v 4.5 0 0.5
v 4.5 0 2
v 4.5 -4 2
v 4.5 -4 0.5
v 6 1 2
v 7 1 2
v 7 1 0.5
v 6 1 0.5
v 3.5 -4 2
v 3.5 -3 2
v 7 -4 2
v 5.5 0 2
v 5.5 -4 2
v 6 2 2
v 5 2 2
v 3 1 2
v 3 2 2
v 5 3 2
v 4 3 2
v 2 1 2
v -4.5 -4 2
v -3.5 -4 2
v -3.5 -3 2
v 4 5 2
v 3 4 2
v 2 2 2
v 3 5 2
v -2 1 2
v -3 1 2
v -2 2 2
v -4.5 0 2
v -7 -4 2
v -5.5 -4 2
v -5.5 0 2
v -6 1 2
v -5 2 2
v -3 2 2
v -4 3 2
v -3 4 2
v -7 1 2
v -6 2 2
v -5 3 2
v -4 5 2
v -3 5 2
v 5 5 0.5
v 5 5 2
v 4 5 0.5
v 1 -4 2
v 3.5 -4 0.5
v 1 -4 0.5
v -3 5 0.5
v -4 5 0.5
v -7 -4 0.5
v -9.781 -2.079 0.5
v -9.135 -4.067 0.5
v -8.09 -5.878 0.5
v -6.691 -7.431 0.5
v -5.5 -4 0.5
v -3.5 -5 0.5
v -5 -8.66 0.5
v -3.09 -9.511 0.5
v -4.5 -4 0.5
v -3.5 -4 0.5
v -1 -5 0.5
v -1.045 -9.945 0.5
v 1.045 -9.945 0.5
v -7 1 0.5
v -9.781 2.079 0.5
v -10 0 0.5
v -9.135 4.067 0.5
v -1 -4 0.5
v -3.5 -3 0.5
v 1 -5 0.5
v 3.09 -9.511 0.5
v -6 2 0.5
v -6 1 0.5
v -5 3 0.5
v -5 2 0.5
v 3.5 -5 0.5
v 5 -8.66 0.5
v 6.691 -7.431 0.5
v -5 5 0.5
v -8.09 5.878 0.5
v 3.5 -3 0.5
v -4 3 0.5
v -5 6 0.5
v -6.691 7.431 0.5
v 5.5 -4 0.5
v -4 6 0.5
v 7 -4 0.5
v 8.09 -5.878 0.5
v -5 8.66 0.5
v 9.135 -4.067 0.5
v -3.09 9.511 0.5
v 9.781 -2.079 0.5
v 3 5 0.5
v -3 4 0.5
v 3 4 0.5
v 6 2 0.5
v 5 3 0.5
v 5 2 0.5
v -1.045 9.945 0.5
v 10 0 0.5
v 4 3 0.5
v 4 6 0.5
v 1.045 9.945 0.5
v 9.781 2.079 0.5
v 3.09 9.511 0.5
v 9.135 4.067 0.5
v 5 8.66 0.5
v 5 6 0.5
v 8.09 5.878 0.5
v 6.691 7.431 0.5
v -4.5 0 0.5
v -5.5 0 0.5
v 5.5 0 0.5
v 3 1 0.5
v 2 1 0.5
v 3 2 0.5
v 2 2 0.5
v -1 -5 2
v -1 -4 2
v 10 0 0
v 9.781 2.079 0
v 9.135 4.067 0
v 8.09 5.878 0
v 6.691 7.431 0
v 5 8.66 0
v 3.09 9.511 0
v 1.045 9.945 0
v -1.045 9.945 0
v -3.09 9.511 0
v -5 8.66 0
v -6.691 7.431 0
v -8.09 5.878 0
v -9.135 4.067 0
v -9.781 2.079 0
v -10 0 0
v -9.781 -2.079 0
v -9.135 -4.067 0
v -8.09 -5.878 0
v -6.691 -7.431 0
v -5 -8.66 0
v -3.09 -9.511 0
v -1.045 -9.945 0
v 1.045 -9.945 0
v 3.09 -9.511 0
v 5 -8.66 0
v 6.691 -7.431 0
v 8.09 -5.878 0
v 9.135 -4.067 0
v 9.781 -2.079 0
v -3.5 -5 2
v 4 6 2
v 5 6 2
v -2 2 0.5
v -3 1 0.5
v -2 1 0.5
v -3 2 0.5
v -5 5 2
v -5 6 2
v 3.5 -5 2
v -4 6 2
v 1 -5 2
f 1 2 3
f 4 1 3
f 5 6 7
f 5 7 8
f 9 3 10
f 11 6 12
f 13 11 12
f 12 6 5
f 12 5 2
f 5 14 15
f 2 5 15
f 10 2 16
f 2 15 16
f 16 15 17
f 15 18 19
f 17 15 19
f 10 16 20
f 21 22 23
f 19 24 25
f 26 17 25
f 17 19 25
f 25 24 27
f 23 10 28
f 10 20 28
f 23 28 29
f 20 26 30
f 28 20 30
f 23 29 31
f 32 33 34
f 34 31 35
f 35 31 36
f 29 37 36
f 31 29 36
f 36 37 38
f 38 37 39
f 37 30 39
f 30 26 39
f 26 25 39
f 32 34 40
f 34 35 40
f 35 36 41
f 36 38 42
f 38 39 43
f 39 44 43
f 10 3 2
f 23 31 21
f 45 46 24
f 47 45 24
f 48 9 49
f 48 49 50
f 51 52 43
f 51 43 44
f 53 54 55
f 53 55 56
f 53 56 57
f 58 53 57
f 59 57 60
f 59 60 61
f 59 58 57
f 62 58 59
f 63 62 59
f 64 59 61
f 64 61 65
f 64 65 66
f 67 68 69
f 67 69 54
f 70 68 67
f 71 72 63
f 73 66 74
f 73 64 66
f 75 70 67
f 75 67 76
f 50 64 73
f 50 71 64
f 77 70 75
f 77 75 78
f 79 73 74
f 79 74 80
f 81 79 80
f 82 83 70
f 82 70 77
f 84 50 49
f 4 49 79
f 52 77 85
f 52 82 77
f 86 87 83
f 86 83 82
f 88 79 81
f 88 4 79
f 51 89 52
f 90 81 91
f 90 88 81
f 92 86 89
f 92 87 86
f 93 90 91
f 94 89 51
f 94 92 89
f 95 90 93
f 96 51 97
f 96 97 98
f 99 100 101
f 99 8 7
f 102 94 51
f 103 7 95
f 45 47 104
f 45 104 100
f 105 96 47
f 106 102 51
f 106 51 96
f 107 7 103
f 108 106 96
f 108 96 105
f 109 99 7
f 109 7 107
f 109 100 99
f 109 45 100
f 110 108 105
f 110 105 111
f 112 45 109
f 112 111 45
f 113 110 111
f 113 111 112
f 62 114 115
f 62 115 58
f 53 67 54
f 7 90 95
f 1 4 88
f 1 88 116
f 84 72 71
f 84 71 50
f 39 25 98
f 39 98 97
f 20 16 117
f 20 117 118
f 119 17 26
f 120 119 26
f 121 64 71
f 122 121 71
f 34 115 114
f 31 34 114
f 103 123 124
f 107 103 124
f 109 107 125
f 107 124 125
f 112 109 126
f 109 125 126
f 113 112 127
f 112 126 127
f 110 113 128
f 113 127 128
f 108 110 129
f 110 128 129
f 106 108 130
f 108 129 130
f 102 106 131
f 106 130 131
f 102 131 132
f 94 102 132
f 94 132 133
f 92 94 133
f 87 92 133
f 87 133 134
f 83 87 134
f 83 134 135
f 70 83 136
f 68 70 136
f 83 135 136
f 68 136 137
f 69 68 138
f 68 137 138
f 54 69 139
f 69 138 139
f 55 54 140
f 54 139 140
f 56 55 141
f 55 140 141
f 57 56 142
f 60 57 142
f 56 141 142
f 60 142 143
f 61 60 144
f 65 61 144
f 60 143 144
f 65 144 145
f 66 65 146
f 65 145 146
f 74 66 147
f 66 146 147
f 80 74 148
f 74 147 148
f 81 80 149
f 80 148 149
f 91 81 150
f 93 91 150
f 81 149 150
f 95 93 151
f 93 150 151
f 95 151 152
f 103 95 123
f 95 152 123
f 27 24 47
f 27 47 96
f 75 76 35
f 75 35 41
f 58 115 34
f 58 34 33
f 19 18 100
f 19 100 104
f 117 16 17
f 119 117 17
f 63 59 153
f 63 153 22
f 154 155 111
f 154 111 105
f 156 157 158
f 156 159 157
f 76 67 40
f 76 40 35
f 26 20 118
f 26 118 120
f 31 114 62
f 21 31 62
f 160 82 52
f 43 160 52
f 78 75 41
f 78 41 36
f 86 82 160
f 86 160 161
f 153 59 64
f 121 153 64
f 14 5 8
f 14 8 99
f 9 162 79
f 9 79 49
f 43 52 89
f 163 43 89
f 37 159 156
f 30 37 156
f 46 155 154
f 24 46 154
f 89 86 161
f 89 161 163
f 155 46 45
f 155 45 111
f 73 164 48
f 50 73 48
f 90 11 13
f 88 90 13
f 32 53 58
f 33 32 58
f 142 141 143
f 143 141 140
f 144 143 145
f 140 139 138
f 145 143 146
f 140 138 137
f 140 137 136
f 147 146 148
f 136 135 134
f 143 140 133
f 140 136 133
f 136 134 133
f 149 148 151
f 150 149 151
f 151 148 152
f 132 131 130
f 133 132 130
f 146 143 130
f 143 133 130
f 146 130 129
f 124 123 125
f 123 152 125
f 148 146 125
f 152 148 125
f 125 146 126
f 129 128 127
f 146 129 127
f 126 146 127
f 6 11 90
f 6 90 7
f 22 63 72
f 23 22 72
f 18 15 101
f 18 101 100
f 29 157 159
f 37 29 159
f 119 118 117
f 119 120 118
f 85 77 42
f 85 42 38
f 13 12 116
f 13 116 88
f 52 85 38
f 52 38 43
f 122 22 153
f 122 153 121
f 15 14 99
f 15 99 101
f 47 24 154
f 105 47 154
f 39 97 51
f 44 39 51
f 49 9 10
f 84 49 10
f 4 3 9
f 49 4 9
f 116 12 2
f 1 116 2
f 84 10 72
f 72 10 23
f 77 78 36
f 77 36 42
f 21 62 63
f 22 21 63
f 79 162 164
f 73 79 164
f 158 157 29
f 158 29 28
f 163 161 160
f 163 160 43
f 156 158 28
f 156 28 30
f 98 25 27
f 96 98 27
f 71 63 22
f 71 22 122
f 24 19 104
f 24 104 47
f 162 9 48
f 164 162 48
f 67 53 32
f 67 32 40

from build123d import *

# Parameters (mm, degrees)
BOX025_W                  = 1
BOX025_H                  = 1
BOX025_DEPTH              = 2
BOX027_W                  = 10
BOX027_H                  = 10
BOX027_DEPTH              = 10
BOX024_W                  = 10
BOX024_H                  = 10
BOX024_DEPTH              = 10
BOX017_W                  = 1
BOX017_H                  = 1
BOX017_DEPTH              = 2
BOX018_W                  = 1
BOX018_H                  = 1
BOX018_DEPTH              = 2
BOX019_W                  = 4
BOX019_H                  = 1
BOX019_DEPTH              = 2
BOX020_W                  = 1
BOX020_H                  = 1
BOX020_DEPTH              = 2
BOX021_W                  = 1
BOX021_H                  = 1
BOX021_DEPTH              = 2
BOX022_W                  = 4
BOX022_H                  = 1
BOX022_DEPTH              = 2
BOX023_W                  = 3.5
BOX023_H                  = 1
BOX023_DEPTH              = 2
BOX016_W                  = 1
BOX016_H                  = 1
BOX016_DEPTH              = 2
BOX015_W                  = 7
BOX015_H                  = 10
BOX015_DEPTH              = 2
BOX028_W                  = 1
BOX028_H                  = 1
BOX028_DEPTH              = 2
BOX026_W                  = 1
BOX026_H                  = 1
BOX026_DEPTH              = 2
BOX029_W                  = 2.5
BOX029_H                  = 1
BOX029_DEPTH              = 2
FUSION001_PLACEMENT_ANGLE = 180
BOX010_W                  = 1
BOX010_H                  = 1
BOX010_DEPTH              = 2
BOX012_W                  = 10
BOX012_H                  = 10
BOX012_DEPTH              = 10
BOX009_W                  = 10
BOX009_H                  = 10
BOX009_DEPTH              = 10
BOX002_W                  = 1
BOX002_H                  = 1
BOX002_DEPTH              = 2
BOX003_W                  = 1
BOX003_H                  = 1
BOX003_DEPTH              = 2
BOX004_W                  = 4
BOX004_H                  = 1
BOX004_DEPTH              = 2
BOX005_W                  = 1
BOX005_H                  = 1
BOX005_DEPTH              = 2
BOX006_W                  = 1
BOX006_H                  = 1
BOX006_DEPTH              = 2
BOX007_W                  = 4
BOX007_H                  = 1
BOX007_DEPTH              = 2
BOX008_W                  = 3.5
BOX008_H                  = 1
BOX008_DEPTH              = 2
BOX001_W                  = 1
BOX001_H                  = 1
BOX001_DEPTH              = 2
BOX_W                     = 7
BOX_H                     = 10
BOX_DEPTH                 = 2
BOX013_W                  = 1
BOX013_H                  = 1
BOX013_DEPTH              = 2
BOX011_W                  = 1
BOX011_H                  = 1
BOX011_DEPTH              = 2
BOX014_W                  = 2.5
BOX014_H                  = 1
BOX014_DEPTH              = 2
CYLINDER_R                = 10
CYLINDER_DEPTH            = 0.5


with BuildPart() as cubo025:
    # Box025 → Box025 (new body)
    with BuildSketch(Plane(origin=(-5, 3, 0), x_dir=(1, 0, 0), z_dir=(0, 0, 1))):
        with Locations((0.5, 0.5)):
            Rectangle(BOX025_W, BOX025_H)
    extrude(amount=BOX025_DEPTH)


with BuildPart() as cubo027:
    # Box027 → Box027 (new body)
    with BuildSketch(Plane(origin=(-15, 1, 0), x_dir=(1, 0, 0), z_dir=(0, 0, 1))):
        with Locations((5, 5)):
            Rectangle(BOX027_W, BOX027_H)
    extrude(amount=BOX027_DEPTH)


with BuildPart() as cubo024:
    # Box024 → Box024 (new body)
    with BuildSketch(Plane(origin=(-4, 3, 0), x_dir=(1, 0, 0), z_dir=(0, 0, 1))):
        with Locations((5, 5)):
            Rectangle(BOX024_W, BOX024_H)
    extrude(amount=BOX024_DEPTH)


with BuildPart() as cubo017:
    # Box017 → Box017 (new body)
    with BuildSketch(Plane(origin=(-3, 0, 0), x_dir=(1, 0, 0), z_dir=(0, 0, 1))):
        with Locations((0.5, 0.5)):
            Rectangle(BOX017_W, BOX017_H)
    extrude(amount=BOX017_DEPTH)


with BuildPart() as cubo018:
    # Box018 → Box018 (new body)
    with BuildSketch(Plane(origin=(-5, 2, 0), x_dir=(1, 0, 0), z_dir=(0, 0, 1))):
        with Locations((0.5, 0.5)):
            Rectangle(BOX018_W, BOX018_H)
    extrude(amount=BOX018_DEPTH)


with BuildPart() as cubo019:
    # Box019 → Box019 (new body)
    with BuildSketch(Plane(origin=(-5.5, -1, 0), x_dir=(0, -1, 0), z_dir=(0, 0, 1))):
        with Locations((2, 0.5)):
            Rectangle(BOX019_W, BOX019_H)
    extrude(amount=BOX019_DEPTH)


with BuildPart() as cubo020:
    # Box020 → Box020 (new body)
    with BuildSketch(Plane(origin=(-5, 4, 0), x_dir=(1, 0, 0), z_dir=(0, 0, 1))):
        with Locations((0.5, 0.5)):
            Rectangle(BOX020_W, BOX020_H)
    extrude(amount=BOX020_DEPTH)


with BuildPart() as cubo021:
    # Box021 → Box021 (new body)
    with BuildSketch(Plane(origin=(-6, 1, 0), x_dir=(1, 0, 0), z_dir=(0, 0, 1))):
        with Locations((0.5, 0.5)):
            Rectangle(BOX021_W, BOX021_H)
    extrude(amount=BOX021_DEPTH)


with BuildPart() as cubo022:
    # Box022 → Box022 (new body)
    with BuildSketch(Plane(origin=(-4, 3, 0), x_dir=(1, 0, 0), z_dir=(0, 0, 1))):
        with Locations((2, 0.5)):
            Rectangle(BOX022_W, BOX022_H)
    extrude(amount=BOX022_DEPTH)


with BuildPart() as cubo023:
    # Box023 → Box023 (new body)
    with BuildSketch(Plane(origin=(-3.5, -5, 0), x_dir=(1, 0, 0), z_dir=(0, 0, 1))):
        with Locations((1.75, 0.5)):
            Rectangle(BOX023_W, BOX023_H)
    extrude(amount=BOX023_DEPTH)


with BuildPart() as cubo016:
    # Box016 → Box016 (new body)
    with BuildSketch(Plane(origin=(-7, 0, 0), x_dir=(1, 0, 0), z_dir=(0, 0, 1))):
        with Locations((0.5, 0.5)):
            Rectangle(BOX016_W, BOX016_H)
    extrude(amount=BOX016_DEPTH)


with BuildPart() as cut021:
    # Box015 → Box015 (new body)
    with BuildSketch(Plane(origin=(-7, -5, 0), x_dir=(1, 0, 0), z_dir=(0, 0, 1))):
        with Locations((3.5, 5)):
            Rectangle(BOX015_W, BOX015_H)
    extrude(amount=BOX015_DEPTH)

    # Cut011: cut Cubo016
    add(cubo016.part, mode=Mode.SUBTRACT)

    # Cut012: cut Cubo023
    add(cubo023.part, mode=Mode.SUBTRACT)

    # Cut013: cut Cubo022
    add(cubo022.part, mode=Mode.SUBTRACT)

    # Cut014: cut Cubo021
    add(cubo021.part, mode=Mode.SUBTRACT)

    # Cut015: cut Cubo020
    add(cubo020.part, mode=Mode.SUBTRACT)

    # Cut016: cut Cubo019
    add(cubo019.part, mode=Mode.SUBTRACT)

    # Cut017: cut Cubo018
    add(cubo018.part, mode=Mode.SUBTRACT)

    # Cut018: cut Cubo017
    add(cubo017.part, mode=Mode.SUBTRACT)

    # Cut019: cut Cubo024
    add(cubo024.part, mode=Mode.SUBTRACT)

    # Cut020: cut Cubo027
    add(cubo027.part, mode=Mode.SUBTRACT)

    # Cut021: cut Cubo025
    add(cubo025.part, mode=Mode.SUBTRACT)


with BuildPart() as cubo028:
    # Box028 → Box028 (new body)
    with BuildSketch(Plane(origin=(-4, 3, 0), x_dir=(1, 0, 0), z_dir=(0, 0, 1))):
        with Locations((0.5, 0.5)):
            Rectangle(BOX028_W, BOX028_H)
    extrude(amount=BOX028_DEPTH)


with BuildPart() as cubo026:
    # Box026 → Box026 (new body)
    with BuildSketch(Plane(origin=(-5, 4, 0), x_dir=(1, 0, 0), z_dir=(0, 0, 1))):
        with Locations((0.5, 0.5)):
            Rectangle(BOX026_W, BOX026_H)
    extrude(amount=BOX026_DEPTH)


with BuildPart() as fusion001:
    # Box029 → Box029 (new body)
    with BuildSketch(Plane(origin=(-3.5, -6, 0), x_dir=(1, 0, 0), z_dir=(0, 0, 1))):
        with Locations((1.25, 0.5)):
            Rectangle(BOX029_W, BOX029_H)
    extrude(amount=BOX029_DEPTH)

    # Fusion001: union Cut021, Cubo028, Cubo026
    add(cut021.part)
    add(cubo028.part)
    add(cubo026.part)


with BuildPart() as fusion001_1:
    # Fusion001 placement: moved
    add(fusion001.part.moved(Location((0, 0, 2))).rotate(Axis((0, 0, 2), (0, 1, 0)), FUSION001_PLACEMENT_ANGLE))


with BuildPart() as cubo010:
    # Box010 → Box010 (new body)
    with BuildSketch(Plane(origin=(-5, 3, 0), x_dir=(1, 0, 0), z_dir=(0, 0, 1))):
        with Locations((0.5, 0.5)):
            Rectangle(BOX010_W, BOX010_H)
    extrude(amount=BOX010_DEPTH)


with BuildPart() as cubo012:
    # Box012 → Box012 (new body)
    with BuildSketch(Plane(origin=(-15, 1, 0), x_dir=(1, 0, 0), z_dir=(0, 0, 1))):
        with Locations((5, 5)):
            Rectangle(BOX012_W, BOX012_H)
    extrude(amount=BOX012_DEPTH)


with BuildPart() as cubo009:
    # Box009 → Box009 (new body)
    with BuildSketch(Plane(origin=(-4, 3, 0), x_dir=(1, 0, 0), z_dir=(0, 0, 1))):
        with Locations((5, 5)):
            Rectangle(BOX009_W, BOX009_H)
    extrude(amount=BOX009_DEPTH)


with BuildPart() as cubo002:
    # Box002 → Box002 (new body)
    with BuildSketch(Plane(origin=(-3, 0, 0), x_dir=(1, 0, 0), z_dir=(0, 0, 1))):
        with Locations((0.5, 0.5)):
            Rectangle(BOX002_W, BOX002_H)
    extrude(amount=BOX002_DEPTH)


with BuildPart() as cubo003:
    # Box003 → Box003 (new body)
    with BuildSketch(Plane(origin=(-5, 2, 0), x_dir=(1, 0, 0), z_dir=(0, 0, 1))):
        with Locations((0.5, 0.5)):
            Rectangle(BOX003_W, BOX003_H)
    extrude(amount=BOX003_DEPTH)


with BuildPart() as cubo004:
    # Box004 → Box004 (new body)
    with BuildSketch(Plane(origin=(-5.5, -1, 0), x_dir=(0, -1, 0), z_dir=(0, 0, 1))):
        with Locations((2, 0.5)):
            Rectangle(BOX004_W, BOX004_H)
    extrude(amount=BOX004_DEPTH)


with BuildPart() as cubo005:
    # Box005 → Box005 (new body)
    with BuildSketch(Plane(origin=(-5, 4, 0), x_dir=(1, 0, 0), z_dir=(0, 0, 1))):
        with Locations((0.5, 0.5)):
            Rectangle(BOX005_W, BOX005_H)
    extrude(amount=BOX005_DEPTH)


with BuildPart() as cubo006:
    # Box006 → Box006 (new body)
    with BuildSketch(Plane(origin=(-6, 1, 0), x_dir=(1, 0, 0), z_dir=(0, 0, 1))):
        with Locations((0.5, 0.5)):
            Rectangle(BOX006_W, BOX006_H)
    extrude(amount=BOX006_DEPTH)


with BuildPart() as cubo007:
    # Box007 → Box007 (new body)
    with BuildSketch(Plane(origin=(-4, 3, 0), x_dir=(1, 0, 0), z_dir=(0, 0, 1))):
        with Locations((2, 0.5)):
            Rectangle(BOX007_W, BOX007_H)
    extrude(amount=BOX007_DEPTH)


with BuildPart() as cubo008:
    # Box008 → Box008 (new body)
    with BuildSketch(Plane(origin=(-3.5, -5, 0), x_dir=(1, 0, 0), z_dir=(0, 0, 1))):
        with Locations((1.75, 0.5)):
            Rectangle(BOX008_W, BOX008_H)
    extrude(amount=BOX008_DEPTH)


with BuildPart() as cubo001:
    # Box001 → Box001 (new body)
    with BuildSketch(Plane(origin=(-7, 0, 0), x_dir=(1, 0, 0), z_dir=(0, 0, 1))):
        with Locations((0.5, 0.5)):
            Rectangle(BOX001_W, BOX001_H)
    extrude(amount=BOX001_DEPTH)


with BuildPart() as cut010:
    # Box → Box (new body)
    with BuildSketch(Plane(origin=(-7, -5, 0), x_dir=(1, 0, 0), z_dir=(0, 0, 1))):
        with Locations((3.5, 5)):
            Rectangle(BOX_W, BOX_H)
    extrude(amount=BOX_DEPTH)

    # Cut: cut Cubo001
    add(cubo001.part, mode=Mode.SUBTRACT)

    # Cut001: cut Cubo008
    add(cubo008.part, mode=Mode.SUBTRACT)

    # Cut002: cut Cubo007
    add(cubo007.part, mode=Mode.SUBTRACT)

    # Cut003: cut Cubo006
    add(cubo006.part, mode=Mode.SUBTRACT)

    # Cut004: cut Cubo005
    add(cubo005.part, mode=Mode.SUBTRACT)

    # Cut005: cut Cubo004
    add(cubo004.part, mode=Mode.SUBTRACT)

    # Cut006: cut Cubo003
    add(cubo003.part, mode=Mode.SUBTRACT)

    # Cut007: cut Cubo002
    add(cubo002.part, mode=Mode.SUBTRACT)

    # Cut008: cut Cubo009
    add(cubo009.part, mode=Mode.SUBTRACT)

    # Cut009: cut Cubo012
    add(cubo012.part, mode=Mode.SUBTRACT)

    # Cut010: cut Cubo010
    add(cubo010.part, mode=Mode.SUBTRACT)


with BuildPart() as cubo013:
    # Box013 → Box013 (new body)
    with BuildSketch(Plane(origin=(-4, 3, 0), x_dir=(1, 0, 0), z_dir=(0, 0, 1))):
        with Locations((0.5, 0.5)):
            Rectangle(BOX013_W, BOX013_H)
    extrude(amount=BOX013_DEPTH)


with BuildPart() as cubo011:
    # Box011 → Box011 (new body)
    with BuildSketch(Plane(origin=(-5, 4, 0), x_dir=(1, 0, 0), z_dir=(0, 0, 1))):
        with Locations((0.5, 0.5)):
            Rectangle(BOX011_W, BOX011_H)
    extrude(amount=BOX011_DEPTH)


with BuildPart() as fusion002:
    # Box014 → Box014 (new body)
    with BuildSketch(Plane(origin=(-3.5, -6, 0), x_dir=(1, 0, 0), z_dir=(0, 0, 1))):
        with Locations((1.25, 0.5)):
            Rectangle(BOX014_W, BOX014_H)
    extrude(amount=BOX014_DEPTH)

    # Fusion: union Cut010, Cubo013, Cubo011
    add(cut010.part)
    add(cubo013.part)
    add(cubo011.part)

    # Fusion002: union Fusion001
    add(fusion001_1.part)


with BuildPart() as fusion002_1:
    # Fusion002 placement: moved
    add(fusion002.part.moved(Location((0, 1, 0))))


with BuildPart() as fusion003:
    # Cylinder → Cylinder (new body)
    with BuildSketch(Plane.XY):
        Circle(CYLINDER_R)
    extrude(amount=CYLINDER_DEPTH)

    # Fusion003: union Fusion002
    add(fusion002_1.part)


solid = fusion003.part
